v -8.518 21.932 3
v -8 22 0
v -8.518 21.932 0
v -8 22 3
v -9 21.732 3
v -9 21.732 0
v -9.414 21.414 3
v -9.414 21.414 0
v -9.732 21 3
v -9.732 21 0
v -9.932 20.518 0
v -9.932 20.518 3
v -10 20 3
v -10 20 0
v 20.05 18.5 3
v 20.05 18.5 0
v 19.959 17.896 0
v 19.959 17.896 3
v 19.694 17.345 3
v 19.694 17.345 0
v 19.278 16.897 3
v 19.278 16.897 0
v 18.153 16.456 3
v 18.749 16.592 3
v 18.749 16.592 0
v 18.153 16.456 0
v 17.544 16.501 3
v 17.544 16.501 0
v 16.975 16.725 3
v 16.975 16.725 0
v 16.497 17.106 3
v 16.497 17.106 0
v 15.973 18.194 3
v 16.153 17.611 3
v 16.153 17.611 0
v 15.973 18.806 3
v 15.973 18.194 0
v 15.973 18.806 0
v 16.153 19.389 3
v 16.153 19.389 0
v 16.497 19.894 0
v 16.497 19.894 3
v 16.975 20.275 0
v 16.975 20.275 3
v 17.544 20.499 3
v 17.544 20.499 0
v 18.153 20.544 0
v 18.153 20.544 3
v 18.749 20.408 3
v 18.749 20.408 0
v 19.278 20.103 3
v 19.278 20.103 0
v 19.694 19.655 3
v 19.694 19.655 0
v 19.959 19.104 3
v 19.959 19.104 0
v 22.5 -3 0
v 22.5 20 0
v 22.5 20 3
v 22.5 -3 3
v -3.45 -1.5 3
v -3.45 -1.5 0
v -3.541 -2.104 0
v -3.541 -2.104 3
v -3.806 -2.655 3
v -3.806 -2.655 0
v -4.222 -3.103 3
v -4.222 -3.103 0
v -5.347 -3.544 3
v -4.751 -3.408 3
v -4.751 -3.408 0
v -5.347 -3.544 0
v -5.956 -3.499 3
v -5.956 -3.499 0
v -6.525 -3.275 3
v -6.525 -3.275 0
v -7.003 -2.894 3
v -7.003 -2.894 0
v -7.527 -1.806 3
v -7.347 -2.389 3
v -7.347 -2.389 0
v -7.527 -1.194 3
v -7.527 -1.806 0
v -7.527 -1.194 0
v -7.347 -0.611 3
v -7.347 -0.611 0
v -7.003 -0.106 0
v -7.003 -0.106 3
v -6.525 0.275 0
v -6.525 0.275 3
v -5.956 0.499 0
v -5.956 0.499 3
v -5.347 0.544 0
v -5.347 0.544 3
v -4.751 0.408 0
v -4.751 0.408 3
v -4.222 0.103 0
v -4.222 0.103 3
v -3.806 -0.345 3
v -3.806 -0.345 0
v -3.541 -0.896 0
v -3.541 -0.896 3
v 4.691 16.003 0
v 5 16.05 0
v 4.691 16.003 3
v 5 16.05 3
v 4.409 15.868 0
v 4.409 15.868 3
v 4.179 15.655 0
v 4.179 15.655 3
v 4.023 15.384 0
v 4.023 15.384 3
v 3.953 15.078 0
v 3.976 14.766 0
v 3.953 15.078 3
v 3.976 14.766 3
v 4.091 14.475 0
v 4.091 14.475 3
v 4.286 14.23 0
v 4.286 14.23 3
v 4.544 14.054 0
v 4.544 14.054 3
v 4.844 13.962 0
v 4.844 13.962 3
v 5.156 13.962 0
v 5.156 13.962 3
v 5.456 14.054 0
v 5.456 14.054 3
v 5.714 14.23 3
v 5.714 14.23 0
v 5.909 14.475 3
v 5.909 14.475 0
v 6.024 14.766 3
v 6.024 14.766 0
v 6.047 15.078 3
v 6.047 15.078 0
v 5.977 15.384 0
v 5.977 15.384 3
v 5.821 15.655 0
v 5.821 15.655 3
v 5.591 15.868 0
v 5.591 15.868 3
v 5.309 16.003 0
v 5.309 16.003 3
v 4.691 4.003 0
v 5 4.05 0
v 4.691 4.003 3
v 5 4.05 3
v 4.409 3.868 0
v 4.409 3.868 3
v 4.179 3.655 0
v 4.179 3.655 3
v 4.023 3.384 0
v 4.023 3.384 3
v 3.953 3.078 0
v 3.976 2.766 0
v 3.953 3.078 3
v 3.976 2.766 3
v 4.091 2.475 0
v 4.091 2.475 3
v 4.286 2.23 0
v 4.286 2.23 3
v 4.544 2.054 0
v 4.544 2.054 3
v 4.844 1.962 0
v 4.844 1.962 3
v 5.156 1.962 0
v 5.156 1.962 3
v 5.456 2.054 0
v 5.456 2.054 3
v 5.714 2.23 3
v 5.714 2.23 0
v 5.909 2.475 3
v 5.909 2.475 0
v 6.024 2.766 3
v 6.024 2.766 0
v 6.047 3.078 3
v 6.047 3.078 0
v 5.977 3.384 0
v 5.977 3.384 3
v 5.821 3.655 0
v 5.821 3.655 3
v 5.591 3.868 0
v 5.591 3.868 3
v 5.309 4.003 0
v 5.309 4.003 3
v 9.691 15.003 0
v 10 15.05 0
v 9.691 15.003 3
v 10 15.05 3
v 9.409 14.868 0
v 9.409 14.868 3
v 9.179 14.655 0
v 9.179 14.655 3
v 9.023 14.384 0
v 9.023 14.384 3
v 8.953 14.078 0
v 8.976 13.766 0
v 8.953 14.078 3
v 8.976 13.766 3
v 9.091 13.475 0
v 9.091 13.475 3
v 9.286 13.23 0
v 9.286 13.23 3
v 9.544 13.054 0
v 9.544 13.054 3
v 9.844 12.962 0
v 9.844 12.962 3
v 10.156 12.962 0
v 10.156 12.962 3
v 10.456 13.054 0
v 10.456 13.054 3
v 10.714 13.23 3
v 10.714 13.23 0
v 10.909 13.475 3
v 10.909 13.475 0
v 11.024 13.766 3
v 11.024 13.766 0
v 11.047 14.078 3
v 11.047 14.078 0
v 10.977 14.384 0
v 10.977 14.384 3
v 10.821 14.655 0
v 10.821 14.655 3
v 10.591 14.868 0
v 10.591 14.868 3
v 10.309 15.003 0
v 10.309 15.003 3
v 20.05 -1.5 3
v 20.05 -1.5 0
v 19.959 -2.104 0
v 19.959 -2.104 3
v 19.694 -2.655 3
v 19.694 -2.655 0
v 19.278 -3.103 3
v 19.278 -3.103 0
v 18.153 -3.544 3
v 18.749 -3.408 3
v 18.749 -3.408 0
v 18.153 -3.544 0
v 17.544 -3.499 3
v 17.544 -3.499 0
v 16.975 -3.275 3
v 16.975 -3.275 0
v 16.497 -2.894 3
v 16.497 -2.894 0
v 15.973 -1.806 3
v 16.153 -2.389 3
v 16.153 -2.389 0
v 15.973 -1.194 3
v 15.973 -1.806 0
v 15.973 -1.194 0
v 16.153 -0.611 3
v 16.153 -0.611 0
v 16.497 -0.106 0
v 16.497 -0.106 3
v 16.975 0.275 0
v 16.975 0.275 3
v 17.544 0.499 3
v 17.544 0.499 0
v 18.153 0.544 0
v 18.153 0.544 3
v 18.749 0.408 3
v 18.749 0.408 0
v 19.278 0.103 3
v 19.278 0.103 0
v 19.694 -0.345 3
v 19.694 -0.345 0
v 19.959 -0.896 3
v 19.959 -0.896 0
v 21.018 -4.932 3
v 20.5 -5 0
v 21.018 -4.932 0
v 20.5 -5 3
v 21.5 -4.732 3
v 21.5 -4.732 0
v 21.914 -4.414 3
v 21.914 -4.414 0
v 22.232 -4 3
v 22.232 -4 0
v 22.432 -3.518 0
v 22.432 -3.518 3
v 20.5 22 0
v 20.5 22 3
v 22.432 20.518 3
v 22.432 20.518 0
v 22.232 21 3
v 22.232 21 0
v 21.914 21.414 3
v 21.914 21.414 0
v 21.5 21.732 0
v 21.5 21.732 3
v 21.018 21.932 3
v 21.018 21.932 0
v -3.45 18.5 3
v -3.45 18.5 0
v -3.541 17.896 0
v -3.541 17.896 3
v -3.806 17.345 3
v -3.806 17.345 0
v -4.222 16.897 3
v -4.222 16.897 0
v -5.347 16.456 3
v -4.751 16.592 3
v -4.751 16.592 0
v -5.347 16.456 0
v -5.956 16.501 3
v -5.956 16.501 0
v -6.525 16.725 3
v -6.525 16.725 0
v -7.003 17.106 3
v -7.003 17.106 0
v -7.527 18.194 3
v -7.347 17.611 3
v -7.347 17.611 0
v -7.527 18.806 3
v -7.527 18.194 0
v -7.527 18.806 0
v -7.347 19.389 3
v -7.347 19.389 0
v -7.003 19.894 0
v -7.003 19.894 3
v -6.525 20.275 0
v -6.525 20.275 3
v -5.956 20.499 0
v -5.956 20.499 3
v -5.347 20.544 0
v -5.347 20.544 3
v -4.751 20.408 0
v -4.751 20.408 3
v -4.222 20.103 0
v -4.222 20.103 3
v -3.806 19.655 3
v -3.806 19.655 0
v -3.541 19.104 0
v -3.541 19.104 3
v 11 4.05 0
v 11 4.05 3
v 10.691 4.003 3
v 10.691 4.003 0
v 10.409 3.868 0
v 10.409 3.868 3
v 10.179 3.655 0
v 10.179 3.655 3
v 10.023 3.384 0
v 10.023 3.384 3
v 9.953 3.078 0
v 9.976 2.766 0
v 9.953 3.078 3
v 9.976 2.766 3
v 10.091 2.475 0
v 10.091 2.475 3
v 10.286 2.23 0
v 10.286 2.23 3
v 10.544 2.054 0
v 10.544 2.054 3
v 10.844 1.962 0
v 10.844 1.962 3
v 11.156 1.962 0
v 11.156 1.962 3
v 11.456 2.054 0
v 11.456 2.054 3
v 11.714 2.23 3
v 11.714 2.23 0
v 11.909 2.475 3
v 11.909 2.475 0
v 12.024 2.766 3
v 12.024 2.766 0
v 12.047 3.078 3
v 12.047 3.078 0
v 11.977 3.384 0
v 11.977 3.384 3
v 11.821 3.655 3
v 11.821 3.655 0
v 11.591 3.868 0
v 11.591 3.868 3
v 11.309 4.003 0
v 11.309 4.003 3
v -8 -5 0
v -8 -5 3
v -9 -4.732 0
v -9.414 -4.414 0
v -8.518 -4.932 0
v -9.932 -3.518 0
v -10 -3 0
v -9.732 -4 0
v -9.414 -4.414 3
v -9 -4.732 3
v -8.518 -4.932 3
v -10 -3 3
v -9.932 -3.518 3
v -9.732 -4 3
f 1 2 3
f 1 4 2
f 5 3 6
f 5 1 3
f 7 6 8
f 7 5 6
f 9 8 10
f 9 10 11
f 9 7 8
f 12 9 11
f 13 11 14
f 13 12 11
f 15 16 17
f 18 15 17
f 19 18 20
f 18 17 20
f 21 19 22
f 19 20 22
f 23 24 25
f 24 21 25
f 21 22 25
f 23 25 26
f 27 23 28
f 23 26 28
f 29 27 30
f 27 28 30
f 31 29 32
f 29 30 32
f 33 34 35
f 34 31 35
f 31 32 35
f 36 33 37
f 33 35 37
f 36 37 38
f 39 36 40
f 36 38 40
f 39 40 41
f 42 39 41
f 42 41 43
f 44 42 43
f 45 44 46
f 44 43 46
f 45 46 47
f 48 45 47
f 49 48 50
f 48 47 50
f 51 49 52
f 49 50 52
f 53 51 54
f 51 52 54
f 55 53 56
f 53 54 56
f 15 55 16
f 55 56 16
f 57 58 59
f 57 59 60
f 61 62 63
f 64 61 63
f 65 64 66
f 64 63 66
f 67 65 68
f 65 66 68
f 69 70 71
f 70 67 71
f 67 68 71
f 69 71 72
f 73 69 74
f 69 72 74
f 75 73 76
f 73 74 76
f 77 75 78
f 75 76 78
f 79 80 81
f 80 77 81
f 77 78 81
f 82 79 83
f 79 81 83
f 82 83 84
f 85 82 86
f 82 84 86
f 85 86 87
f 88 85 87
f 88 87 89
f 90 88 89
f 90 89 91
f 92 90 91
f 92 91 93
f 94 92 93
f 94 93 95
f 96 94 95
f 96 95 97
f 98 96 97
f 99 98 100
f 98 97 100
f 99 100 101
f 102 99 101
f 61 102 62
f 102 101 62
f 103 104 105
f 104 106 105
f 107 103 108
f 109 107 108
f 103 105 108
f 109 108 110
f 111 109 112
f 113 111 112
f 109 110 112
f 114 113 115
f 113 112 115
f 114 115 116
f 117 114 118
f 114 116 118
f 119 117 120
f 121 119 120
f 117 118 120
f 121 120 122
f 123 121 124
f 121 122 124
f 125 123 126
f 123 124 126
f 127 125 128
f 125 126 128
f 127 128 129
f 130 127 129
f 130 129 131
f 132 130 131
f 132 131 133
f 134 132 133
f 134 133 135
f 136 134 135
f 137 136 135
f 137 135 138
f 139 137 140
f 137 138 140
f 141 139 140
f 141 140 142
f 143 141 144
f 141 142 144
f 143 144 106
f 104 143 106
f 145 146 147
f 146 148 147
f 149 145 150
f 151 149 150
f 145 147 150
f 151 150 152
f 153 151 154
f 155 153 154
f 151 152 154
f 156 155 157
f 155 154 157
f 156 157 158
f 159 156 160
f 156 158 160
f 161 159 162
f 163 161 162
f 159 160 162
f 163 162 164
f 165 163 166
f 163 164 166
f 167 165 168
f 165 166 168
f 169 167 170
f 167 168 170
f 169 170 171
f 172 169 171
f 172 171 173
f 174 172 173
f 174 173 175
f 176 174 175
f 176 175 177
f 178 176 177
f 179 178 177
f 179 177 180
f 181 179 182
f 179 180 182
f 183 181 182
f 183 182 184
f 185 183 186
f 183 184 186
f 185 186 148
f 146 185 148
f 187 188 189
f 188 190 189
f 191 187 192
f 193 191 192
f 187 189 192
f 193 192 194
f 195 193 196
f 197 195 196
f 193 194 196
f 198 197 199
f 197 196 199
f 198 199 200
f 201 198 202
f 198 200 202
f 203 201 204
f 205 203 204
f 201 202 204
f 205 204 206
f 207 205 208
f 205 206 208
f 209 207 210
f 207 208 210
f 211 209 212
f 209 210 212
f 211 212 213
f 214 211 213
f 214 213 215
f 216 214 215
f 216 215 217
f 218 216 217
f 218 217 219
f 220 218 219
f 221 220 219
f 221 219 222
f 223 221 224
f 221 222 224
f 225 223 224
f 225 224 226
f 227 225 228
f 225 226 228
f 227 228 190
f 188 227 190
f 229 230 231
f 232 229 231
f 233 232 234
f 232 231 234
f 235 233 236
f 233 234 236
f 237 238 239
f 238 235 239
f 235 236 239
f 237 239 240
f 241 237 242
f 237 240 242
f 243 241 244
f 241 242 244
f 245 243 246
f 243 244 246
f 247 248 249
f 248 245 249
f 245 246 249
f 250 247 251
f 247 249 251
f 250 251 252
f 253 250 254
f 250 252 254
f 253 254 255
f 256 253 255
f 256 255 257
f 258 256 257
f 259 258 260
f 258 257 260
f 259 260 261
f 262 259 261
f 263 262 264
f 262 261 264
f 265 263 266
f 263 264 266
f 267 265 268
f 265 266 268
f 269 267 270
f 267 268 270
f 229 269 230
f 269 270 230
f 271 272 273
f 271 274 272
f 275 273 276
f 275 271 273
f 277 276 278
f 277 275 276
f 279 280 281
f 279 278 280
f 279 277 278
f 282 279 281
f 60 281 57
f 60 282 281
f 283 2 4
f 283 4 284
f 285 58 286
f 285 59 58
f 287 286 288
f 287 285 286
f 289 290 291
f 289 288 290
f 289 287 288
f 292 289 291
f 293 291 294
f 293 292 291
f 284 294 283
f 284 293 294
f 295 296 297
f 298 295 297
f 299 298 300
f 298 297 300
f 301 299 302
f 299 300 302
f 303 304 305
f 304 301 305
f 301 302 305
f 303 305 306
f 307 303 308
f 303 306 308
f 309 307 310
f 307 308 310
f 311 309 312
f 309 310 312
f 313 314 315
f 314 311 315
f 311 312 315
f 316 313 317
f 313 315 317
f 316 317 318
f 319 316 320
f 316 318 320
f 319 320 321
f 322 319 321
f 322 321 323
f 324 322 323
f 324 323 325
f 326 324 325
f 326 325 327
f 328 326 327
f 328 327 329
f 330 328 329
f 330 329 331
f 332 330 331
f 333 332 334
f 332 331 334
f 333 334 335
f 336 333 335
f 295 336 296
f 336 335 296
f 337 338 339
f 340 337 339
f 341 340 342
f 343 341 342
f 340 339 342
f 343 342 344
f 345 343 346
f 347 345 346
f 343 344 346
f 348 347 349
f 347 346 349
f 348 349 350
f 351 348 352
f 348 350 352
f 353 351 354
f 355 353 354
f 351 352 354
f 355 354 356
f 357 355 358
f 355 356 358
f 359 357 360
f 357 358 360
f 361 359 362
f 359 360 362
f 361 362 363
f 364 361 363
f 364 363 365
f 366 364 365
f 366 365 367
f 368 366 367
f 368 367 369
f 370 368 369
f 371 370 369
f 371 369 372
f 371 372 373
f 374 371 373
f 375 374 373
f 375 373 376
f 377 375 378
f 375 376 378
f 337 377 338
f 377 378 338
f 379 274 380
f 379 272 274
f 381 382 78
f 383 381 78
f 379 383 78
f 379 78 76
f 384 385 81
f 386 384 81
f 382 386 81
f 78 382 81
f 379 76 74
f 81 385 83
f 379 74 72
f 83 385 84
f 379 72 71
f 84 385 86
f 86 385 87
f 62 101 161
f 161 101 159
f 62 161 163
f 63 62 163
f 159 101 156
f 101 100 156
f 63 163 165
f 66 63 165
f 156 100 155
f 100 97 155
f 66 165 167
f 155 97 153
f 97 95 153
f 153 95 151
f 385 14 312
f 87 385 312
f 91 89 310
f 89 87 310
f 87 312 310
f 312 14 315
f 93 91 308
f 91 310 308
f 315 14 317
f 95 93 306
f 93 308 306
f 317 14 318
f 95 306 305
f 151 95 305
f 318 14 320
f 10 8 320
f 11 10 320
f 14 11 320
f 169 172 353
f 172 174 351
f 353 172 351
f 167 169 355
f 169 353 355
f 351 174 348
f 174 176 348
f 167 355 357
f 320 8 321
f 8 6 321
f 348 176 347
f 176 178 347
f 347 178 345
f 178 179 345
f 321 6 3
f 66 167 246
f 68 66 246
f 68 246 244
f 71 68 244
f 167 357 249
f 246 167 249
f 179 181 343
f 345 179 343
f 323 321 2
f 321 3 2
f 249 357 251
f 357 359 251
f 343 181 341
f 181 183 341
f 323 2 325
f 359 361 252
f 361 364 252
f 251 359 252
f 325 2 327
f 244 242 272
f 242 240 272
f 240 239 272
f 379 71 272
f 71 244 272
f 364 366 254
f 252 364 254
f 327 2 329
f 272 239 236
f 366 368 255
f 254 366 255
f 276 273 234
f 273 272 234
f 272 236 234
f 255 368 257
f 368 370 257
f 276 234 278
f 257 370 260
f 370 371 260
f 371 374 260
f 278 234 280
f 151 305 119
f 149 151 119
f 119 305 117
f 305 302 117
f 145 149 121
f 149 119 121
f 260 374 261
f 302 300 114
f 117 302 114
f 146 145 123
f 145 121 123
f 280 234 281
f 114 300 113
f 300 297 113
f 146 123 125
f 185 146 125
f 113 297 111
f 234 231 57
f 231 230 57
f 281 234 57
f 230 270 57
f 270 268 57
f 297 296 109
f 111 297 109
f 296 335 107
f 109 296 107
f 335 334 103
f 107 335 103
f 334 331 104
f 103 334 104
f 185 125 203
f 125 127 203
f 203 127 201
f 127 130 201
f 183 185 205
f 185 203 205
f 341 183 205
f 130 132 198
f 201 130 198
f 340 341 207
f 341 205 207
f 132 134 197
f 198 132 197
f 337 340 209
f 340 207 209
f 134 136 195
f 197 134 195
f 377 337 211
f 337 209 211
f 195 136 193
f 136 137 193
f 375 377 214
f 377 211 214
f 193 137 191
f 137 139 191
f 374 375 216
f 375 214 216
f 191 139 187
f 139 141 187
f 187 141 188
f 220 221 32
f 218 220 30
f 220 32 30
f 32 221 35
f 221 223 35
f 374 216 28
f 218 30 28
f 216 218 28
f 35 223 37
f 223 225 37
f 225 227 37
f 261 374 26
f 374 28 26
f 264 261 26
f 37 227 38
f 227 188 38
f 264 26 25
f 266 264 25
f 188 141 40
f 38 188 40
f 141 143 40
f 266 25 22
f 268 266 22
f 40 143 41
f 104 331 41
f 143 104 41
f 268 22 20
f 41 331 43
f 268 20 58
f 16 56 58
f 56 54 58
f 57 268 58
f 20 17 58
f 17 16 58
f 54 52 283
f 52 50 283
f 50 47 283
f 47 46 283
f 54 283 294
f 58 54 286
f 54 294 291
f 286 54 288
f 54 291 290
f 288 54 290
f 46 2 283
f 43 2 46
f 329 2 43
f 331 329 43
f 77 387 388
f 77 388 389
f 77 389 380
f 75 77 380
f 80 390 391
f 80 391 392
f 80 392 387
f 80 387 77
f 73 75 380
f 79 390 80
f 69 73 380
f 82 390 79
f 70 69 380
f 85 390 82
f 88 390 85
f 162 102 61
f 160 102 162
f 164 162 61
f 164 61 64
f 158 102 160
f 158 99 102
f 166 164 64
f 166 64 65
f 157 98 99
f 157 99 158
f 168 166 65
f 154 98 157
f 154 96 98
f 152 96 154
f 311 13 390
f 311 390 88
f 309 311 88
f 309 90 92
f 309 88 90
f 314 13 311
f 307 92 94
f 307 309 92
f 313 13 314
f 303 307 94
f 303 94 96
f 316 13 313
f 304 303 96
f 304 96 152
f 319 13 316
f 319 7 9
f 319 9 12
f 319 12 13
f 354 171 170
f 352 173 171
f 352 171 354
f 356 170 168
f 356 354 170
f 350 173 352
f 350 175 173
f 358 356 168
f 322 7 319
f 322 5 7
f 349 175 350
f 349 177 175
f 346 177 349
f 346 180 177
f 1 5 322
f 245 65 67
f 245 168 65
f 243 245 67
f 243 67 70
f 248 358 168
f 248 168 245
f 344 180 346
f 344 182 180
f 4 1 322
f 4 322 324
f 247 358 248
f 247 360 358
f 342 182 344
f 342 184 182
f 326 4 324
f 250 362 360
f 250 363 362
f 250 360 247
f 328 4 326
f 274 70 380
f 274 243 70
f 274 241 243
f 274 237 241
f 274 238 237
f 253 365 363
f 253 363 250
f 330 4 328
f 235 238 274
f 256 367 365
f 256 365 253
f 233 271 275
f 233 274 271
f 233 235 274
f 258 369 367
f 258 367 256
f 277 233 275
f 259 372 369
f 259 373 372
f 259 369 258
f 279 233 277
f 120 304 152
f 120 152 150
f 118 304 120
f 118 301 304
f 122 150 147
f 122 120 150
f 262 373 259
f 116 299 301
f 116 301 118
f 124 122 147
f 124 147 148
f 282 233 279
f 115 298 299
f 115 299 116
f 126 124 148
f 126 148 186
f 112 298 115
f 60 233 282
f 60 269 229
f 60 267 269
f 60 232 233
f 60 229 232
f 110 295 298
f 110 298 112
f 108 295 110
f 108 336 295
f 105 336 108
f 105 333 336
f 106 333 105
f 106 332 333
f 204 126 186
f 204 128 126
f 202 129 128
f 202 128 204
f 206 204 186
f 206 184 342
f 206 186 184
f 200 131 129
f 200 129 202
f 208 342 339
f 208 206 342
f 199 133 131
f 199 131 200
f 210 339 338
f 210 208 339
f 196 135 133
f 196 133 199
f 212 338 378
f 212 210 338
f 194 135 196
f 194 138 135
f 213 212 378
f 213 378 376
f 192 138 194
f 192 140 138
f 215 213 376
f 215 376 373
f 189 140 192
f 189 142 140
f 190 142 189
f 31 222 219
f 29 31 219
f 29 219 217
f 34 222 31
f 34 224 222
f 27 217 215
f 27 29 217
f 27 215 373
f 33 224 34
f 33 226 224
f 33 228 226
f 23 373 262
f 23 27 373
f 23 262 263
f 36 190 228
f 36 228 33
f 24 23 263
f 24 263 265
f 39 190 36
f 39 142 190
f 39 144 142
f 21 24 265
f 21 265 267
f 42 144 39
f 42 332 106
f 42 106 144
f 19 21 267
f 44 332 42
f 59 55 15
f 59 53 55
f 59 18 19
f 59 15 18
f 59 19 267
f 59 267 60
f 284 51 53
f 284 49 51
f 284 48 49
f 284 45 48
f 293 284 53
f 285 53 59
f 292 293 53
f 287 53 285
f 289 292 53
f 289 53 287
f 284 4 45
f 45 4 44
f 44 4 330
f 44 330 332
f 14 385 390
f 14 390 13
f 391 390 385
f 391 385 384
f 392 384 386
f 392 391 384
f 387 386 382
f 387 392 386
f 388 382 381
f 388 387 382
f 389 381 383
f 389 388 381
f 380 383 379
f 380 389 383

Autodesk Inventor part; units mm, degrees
ref_plane "YZ Plane" through (0, 0, 0) normal (1, 0, 0) x (0, 1, 0)
ref_plane "XZ Plane" through (0, 0, 0) normal (0, 1, 0) x (-1, 0, 0)
ref_plane "XY Plane" through (0, 0, 0) normal (0, 0, 1) x (1, 0, 0)
sketch "Sketch1" plane through (0, 0, 0) normal (0, 0, 1) x (1, 0, 0)
  line L0 (0, 0) -> (12.5, 0) construction
  line L1 (12.5, 0) -> (12.5, 17) construction
  line L2 (12.5, 17) -> (0, 17) construction
  line L3 (0, 17) -> (0, 0) construction
  line L4 (5, 3) -> (11, 3) construction
  line L5 (11, 3) -> (11, 15) construction
  line L6 (11, 15) -> (5, 15) construction
  line L7 (5, 15) -> (5, 3) construction
  line L8 (-10, 22) -> (22.5, 22)
  line L9 (22.5, 22) -> (22.5, -5)
  line L10 (22.5, -5) -> (-10, -5)
  line L11 (-10, -5) -> (-10, 22)
  circle A0 centre (-5.5, 18.5) radius 2.05
  circle A1 centre (-5.5, -1.5) radius 2.05
  circle A2 centre (18, -1.5) radius 2.05
  circle A3 centre (18, 18.5) radius 2.05
  point P0 (10, 14)
  dimension "d0" = 12.5
  dimension "d1" = 17
  dimension "d2" = 6
  dimension "d3" = 12
  dimension "d4" = 5
  dimension "d5" = 2
  dimension "d6" = 1
  dimension "d7" = 1
  dimension "d8" = 32.5
  dimension "d9" = 27
  dimension "d10" = 5
  dimension "d11" = 10
  dimension "d12" = 4.1
  dimension "d13" = 4.1
  dimension "d14" = 4.1
  dimension "d15" = 4.1
  dimension "d16" = 3.5
  dimension "d17" = 3.5
  dimension "d18" = 3.5
  dimension "d19" = 3.5
  dimension "d20" = 4.5
  dimension "d21" = 4.5
  dimension "d22" = 4.5
  dimension "d23" = 4.5
extrude "Extrusion1" add sketch "Sketch1" along normal blind 3
hole "Hole1" at (10, 14, 0) at (5, 15, 0) at (5, 3, 0) at (11, 3, 0) direction (0, 0, 1) diameter 2.1 end through all
fillet "Fillet1" radius 2 4 edges at (-10, 22, 1.5) (22.5, 22, 1.5) (22.5, -5, 1.5) (-10, -5, 1.5)
properties part number "Pump Mounting Plate"
